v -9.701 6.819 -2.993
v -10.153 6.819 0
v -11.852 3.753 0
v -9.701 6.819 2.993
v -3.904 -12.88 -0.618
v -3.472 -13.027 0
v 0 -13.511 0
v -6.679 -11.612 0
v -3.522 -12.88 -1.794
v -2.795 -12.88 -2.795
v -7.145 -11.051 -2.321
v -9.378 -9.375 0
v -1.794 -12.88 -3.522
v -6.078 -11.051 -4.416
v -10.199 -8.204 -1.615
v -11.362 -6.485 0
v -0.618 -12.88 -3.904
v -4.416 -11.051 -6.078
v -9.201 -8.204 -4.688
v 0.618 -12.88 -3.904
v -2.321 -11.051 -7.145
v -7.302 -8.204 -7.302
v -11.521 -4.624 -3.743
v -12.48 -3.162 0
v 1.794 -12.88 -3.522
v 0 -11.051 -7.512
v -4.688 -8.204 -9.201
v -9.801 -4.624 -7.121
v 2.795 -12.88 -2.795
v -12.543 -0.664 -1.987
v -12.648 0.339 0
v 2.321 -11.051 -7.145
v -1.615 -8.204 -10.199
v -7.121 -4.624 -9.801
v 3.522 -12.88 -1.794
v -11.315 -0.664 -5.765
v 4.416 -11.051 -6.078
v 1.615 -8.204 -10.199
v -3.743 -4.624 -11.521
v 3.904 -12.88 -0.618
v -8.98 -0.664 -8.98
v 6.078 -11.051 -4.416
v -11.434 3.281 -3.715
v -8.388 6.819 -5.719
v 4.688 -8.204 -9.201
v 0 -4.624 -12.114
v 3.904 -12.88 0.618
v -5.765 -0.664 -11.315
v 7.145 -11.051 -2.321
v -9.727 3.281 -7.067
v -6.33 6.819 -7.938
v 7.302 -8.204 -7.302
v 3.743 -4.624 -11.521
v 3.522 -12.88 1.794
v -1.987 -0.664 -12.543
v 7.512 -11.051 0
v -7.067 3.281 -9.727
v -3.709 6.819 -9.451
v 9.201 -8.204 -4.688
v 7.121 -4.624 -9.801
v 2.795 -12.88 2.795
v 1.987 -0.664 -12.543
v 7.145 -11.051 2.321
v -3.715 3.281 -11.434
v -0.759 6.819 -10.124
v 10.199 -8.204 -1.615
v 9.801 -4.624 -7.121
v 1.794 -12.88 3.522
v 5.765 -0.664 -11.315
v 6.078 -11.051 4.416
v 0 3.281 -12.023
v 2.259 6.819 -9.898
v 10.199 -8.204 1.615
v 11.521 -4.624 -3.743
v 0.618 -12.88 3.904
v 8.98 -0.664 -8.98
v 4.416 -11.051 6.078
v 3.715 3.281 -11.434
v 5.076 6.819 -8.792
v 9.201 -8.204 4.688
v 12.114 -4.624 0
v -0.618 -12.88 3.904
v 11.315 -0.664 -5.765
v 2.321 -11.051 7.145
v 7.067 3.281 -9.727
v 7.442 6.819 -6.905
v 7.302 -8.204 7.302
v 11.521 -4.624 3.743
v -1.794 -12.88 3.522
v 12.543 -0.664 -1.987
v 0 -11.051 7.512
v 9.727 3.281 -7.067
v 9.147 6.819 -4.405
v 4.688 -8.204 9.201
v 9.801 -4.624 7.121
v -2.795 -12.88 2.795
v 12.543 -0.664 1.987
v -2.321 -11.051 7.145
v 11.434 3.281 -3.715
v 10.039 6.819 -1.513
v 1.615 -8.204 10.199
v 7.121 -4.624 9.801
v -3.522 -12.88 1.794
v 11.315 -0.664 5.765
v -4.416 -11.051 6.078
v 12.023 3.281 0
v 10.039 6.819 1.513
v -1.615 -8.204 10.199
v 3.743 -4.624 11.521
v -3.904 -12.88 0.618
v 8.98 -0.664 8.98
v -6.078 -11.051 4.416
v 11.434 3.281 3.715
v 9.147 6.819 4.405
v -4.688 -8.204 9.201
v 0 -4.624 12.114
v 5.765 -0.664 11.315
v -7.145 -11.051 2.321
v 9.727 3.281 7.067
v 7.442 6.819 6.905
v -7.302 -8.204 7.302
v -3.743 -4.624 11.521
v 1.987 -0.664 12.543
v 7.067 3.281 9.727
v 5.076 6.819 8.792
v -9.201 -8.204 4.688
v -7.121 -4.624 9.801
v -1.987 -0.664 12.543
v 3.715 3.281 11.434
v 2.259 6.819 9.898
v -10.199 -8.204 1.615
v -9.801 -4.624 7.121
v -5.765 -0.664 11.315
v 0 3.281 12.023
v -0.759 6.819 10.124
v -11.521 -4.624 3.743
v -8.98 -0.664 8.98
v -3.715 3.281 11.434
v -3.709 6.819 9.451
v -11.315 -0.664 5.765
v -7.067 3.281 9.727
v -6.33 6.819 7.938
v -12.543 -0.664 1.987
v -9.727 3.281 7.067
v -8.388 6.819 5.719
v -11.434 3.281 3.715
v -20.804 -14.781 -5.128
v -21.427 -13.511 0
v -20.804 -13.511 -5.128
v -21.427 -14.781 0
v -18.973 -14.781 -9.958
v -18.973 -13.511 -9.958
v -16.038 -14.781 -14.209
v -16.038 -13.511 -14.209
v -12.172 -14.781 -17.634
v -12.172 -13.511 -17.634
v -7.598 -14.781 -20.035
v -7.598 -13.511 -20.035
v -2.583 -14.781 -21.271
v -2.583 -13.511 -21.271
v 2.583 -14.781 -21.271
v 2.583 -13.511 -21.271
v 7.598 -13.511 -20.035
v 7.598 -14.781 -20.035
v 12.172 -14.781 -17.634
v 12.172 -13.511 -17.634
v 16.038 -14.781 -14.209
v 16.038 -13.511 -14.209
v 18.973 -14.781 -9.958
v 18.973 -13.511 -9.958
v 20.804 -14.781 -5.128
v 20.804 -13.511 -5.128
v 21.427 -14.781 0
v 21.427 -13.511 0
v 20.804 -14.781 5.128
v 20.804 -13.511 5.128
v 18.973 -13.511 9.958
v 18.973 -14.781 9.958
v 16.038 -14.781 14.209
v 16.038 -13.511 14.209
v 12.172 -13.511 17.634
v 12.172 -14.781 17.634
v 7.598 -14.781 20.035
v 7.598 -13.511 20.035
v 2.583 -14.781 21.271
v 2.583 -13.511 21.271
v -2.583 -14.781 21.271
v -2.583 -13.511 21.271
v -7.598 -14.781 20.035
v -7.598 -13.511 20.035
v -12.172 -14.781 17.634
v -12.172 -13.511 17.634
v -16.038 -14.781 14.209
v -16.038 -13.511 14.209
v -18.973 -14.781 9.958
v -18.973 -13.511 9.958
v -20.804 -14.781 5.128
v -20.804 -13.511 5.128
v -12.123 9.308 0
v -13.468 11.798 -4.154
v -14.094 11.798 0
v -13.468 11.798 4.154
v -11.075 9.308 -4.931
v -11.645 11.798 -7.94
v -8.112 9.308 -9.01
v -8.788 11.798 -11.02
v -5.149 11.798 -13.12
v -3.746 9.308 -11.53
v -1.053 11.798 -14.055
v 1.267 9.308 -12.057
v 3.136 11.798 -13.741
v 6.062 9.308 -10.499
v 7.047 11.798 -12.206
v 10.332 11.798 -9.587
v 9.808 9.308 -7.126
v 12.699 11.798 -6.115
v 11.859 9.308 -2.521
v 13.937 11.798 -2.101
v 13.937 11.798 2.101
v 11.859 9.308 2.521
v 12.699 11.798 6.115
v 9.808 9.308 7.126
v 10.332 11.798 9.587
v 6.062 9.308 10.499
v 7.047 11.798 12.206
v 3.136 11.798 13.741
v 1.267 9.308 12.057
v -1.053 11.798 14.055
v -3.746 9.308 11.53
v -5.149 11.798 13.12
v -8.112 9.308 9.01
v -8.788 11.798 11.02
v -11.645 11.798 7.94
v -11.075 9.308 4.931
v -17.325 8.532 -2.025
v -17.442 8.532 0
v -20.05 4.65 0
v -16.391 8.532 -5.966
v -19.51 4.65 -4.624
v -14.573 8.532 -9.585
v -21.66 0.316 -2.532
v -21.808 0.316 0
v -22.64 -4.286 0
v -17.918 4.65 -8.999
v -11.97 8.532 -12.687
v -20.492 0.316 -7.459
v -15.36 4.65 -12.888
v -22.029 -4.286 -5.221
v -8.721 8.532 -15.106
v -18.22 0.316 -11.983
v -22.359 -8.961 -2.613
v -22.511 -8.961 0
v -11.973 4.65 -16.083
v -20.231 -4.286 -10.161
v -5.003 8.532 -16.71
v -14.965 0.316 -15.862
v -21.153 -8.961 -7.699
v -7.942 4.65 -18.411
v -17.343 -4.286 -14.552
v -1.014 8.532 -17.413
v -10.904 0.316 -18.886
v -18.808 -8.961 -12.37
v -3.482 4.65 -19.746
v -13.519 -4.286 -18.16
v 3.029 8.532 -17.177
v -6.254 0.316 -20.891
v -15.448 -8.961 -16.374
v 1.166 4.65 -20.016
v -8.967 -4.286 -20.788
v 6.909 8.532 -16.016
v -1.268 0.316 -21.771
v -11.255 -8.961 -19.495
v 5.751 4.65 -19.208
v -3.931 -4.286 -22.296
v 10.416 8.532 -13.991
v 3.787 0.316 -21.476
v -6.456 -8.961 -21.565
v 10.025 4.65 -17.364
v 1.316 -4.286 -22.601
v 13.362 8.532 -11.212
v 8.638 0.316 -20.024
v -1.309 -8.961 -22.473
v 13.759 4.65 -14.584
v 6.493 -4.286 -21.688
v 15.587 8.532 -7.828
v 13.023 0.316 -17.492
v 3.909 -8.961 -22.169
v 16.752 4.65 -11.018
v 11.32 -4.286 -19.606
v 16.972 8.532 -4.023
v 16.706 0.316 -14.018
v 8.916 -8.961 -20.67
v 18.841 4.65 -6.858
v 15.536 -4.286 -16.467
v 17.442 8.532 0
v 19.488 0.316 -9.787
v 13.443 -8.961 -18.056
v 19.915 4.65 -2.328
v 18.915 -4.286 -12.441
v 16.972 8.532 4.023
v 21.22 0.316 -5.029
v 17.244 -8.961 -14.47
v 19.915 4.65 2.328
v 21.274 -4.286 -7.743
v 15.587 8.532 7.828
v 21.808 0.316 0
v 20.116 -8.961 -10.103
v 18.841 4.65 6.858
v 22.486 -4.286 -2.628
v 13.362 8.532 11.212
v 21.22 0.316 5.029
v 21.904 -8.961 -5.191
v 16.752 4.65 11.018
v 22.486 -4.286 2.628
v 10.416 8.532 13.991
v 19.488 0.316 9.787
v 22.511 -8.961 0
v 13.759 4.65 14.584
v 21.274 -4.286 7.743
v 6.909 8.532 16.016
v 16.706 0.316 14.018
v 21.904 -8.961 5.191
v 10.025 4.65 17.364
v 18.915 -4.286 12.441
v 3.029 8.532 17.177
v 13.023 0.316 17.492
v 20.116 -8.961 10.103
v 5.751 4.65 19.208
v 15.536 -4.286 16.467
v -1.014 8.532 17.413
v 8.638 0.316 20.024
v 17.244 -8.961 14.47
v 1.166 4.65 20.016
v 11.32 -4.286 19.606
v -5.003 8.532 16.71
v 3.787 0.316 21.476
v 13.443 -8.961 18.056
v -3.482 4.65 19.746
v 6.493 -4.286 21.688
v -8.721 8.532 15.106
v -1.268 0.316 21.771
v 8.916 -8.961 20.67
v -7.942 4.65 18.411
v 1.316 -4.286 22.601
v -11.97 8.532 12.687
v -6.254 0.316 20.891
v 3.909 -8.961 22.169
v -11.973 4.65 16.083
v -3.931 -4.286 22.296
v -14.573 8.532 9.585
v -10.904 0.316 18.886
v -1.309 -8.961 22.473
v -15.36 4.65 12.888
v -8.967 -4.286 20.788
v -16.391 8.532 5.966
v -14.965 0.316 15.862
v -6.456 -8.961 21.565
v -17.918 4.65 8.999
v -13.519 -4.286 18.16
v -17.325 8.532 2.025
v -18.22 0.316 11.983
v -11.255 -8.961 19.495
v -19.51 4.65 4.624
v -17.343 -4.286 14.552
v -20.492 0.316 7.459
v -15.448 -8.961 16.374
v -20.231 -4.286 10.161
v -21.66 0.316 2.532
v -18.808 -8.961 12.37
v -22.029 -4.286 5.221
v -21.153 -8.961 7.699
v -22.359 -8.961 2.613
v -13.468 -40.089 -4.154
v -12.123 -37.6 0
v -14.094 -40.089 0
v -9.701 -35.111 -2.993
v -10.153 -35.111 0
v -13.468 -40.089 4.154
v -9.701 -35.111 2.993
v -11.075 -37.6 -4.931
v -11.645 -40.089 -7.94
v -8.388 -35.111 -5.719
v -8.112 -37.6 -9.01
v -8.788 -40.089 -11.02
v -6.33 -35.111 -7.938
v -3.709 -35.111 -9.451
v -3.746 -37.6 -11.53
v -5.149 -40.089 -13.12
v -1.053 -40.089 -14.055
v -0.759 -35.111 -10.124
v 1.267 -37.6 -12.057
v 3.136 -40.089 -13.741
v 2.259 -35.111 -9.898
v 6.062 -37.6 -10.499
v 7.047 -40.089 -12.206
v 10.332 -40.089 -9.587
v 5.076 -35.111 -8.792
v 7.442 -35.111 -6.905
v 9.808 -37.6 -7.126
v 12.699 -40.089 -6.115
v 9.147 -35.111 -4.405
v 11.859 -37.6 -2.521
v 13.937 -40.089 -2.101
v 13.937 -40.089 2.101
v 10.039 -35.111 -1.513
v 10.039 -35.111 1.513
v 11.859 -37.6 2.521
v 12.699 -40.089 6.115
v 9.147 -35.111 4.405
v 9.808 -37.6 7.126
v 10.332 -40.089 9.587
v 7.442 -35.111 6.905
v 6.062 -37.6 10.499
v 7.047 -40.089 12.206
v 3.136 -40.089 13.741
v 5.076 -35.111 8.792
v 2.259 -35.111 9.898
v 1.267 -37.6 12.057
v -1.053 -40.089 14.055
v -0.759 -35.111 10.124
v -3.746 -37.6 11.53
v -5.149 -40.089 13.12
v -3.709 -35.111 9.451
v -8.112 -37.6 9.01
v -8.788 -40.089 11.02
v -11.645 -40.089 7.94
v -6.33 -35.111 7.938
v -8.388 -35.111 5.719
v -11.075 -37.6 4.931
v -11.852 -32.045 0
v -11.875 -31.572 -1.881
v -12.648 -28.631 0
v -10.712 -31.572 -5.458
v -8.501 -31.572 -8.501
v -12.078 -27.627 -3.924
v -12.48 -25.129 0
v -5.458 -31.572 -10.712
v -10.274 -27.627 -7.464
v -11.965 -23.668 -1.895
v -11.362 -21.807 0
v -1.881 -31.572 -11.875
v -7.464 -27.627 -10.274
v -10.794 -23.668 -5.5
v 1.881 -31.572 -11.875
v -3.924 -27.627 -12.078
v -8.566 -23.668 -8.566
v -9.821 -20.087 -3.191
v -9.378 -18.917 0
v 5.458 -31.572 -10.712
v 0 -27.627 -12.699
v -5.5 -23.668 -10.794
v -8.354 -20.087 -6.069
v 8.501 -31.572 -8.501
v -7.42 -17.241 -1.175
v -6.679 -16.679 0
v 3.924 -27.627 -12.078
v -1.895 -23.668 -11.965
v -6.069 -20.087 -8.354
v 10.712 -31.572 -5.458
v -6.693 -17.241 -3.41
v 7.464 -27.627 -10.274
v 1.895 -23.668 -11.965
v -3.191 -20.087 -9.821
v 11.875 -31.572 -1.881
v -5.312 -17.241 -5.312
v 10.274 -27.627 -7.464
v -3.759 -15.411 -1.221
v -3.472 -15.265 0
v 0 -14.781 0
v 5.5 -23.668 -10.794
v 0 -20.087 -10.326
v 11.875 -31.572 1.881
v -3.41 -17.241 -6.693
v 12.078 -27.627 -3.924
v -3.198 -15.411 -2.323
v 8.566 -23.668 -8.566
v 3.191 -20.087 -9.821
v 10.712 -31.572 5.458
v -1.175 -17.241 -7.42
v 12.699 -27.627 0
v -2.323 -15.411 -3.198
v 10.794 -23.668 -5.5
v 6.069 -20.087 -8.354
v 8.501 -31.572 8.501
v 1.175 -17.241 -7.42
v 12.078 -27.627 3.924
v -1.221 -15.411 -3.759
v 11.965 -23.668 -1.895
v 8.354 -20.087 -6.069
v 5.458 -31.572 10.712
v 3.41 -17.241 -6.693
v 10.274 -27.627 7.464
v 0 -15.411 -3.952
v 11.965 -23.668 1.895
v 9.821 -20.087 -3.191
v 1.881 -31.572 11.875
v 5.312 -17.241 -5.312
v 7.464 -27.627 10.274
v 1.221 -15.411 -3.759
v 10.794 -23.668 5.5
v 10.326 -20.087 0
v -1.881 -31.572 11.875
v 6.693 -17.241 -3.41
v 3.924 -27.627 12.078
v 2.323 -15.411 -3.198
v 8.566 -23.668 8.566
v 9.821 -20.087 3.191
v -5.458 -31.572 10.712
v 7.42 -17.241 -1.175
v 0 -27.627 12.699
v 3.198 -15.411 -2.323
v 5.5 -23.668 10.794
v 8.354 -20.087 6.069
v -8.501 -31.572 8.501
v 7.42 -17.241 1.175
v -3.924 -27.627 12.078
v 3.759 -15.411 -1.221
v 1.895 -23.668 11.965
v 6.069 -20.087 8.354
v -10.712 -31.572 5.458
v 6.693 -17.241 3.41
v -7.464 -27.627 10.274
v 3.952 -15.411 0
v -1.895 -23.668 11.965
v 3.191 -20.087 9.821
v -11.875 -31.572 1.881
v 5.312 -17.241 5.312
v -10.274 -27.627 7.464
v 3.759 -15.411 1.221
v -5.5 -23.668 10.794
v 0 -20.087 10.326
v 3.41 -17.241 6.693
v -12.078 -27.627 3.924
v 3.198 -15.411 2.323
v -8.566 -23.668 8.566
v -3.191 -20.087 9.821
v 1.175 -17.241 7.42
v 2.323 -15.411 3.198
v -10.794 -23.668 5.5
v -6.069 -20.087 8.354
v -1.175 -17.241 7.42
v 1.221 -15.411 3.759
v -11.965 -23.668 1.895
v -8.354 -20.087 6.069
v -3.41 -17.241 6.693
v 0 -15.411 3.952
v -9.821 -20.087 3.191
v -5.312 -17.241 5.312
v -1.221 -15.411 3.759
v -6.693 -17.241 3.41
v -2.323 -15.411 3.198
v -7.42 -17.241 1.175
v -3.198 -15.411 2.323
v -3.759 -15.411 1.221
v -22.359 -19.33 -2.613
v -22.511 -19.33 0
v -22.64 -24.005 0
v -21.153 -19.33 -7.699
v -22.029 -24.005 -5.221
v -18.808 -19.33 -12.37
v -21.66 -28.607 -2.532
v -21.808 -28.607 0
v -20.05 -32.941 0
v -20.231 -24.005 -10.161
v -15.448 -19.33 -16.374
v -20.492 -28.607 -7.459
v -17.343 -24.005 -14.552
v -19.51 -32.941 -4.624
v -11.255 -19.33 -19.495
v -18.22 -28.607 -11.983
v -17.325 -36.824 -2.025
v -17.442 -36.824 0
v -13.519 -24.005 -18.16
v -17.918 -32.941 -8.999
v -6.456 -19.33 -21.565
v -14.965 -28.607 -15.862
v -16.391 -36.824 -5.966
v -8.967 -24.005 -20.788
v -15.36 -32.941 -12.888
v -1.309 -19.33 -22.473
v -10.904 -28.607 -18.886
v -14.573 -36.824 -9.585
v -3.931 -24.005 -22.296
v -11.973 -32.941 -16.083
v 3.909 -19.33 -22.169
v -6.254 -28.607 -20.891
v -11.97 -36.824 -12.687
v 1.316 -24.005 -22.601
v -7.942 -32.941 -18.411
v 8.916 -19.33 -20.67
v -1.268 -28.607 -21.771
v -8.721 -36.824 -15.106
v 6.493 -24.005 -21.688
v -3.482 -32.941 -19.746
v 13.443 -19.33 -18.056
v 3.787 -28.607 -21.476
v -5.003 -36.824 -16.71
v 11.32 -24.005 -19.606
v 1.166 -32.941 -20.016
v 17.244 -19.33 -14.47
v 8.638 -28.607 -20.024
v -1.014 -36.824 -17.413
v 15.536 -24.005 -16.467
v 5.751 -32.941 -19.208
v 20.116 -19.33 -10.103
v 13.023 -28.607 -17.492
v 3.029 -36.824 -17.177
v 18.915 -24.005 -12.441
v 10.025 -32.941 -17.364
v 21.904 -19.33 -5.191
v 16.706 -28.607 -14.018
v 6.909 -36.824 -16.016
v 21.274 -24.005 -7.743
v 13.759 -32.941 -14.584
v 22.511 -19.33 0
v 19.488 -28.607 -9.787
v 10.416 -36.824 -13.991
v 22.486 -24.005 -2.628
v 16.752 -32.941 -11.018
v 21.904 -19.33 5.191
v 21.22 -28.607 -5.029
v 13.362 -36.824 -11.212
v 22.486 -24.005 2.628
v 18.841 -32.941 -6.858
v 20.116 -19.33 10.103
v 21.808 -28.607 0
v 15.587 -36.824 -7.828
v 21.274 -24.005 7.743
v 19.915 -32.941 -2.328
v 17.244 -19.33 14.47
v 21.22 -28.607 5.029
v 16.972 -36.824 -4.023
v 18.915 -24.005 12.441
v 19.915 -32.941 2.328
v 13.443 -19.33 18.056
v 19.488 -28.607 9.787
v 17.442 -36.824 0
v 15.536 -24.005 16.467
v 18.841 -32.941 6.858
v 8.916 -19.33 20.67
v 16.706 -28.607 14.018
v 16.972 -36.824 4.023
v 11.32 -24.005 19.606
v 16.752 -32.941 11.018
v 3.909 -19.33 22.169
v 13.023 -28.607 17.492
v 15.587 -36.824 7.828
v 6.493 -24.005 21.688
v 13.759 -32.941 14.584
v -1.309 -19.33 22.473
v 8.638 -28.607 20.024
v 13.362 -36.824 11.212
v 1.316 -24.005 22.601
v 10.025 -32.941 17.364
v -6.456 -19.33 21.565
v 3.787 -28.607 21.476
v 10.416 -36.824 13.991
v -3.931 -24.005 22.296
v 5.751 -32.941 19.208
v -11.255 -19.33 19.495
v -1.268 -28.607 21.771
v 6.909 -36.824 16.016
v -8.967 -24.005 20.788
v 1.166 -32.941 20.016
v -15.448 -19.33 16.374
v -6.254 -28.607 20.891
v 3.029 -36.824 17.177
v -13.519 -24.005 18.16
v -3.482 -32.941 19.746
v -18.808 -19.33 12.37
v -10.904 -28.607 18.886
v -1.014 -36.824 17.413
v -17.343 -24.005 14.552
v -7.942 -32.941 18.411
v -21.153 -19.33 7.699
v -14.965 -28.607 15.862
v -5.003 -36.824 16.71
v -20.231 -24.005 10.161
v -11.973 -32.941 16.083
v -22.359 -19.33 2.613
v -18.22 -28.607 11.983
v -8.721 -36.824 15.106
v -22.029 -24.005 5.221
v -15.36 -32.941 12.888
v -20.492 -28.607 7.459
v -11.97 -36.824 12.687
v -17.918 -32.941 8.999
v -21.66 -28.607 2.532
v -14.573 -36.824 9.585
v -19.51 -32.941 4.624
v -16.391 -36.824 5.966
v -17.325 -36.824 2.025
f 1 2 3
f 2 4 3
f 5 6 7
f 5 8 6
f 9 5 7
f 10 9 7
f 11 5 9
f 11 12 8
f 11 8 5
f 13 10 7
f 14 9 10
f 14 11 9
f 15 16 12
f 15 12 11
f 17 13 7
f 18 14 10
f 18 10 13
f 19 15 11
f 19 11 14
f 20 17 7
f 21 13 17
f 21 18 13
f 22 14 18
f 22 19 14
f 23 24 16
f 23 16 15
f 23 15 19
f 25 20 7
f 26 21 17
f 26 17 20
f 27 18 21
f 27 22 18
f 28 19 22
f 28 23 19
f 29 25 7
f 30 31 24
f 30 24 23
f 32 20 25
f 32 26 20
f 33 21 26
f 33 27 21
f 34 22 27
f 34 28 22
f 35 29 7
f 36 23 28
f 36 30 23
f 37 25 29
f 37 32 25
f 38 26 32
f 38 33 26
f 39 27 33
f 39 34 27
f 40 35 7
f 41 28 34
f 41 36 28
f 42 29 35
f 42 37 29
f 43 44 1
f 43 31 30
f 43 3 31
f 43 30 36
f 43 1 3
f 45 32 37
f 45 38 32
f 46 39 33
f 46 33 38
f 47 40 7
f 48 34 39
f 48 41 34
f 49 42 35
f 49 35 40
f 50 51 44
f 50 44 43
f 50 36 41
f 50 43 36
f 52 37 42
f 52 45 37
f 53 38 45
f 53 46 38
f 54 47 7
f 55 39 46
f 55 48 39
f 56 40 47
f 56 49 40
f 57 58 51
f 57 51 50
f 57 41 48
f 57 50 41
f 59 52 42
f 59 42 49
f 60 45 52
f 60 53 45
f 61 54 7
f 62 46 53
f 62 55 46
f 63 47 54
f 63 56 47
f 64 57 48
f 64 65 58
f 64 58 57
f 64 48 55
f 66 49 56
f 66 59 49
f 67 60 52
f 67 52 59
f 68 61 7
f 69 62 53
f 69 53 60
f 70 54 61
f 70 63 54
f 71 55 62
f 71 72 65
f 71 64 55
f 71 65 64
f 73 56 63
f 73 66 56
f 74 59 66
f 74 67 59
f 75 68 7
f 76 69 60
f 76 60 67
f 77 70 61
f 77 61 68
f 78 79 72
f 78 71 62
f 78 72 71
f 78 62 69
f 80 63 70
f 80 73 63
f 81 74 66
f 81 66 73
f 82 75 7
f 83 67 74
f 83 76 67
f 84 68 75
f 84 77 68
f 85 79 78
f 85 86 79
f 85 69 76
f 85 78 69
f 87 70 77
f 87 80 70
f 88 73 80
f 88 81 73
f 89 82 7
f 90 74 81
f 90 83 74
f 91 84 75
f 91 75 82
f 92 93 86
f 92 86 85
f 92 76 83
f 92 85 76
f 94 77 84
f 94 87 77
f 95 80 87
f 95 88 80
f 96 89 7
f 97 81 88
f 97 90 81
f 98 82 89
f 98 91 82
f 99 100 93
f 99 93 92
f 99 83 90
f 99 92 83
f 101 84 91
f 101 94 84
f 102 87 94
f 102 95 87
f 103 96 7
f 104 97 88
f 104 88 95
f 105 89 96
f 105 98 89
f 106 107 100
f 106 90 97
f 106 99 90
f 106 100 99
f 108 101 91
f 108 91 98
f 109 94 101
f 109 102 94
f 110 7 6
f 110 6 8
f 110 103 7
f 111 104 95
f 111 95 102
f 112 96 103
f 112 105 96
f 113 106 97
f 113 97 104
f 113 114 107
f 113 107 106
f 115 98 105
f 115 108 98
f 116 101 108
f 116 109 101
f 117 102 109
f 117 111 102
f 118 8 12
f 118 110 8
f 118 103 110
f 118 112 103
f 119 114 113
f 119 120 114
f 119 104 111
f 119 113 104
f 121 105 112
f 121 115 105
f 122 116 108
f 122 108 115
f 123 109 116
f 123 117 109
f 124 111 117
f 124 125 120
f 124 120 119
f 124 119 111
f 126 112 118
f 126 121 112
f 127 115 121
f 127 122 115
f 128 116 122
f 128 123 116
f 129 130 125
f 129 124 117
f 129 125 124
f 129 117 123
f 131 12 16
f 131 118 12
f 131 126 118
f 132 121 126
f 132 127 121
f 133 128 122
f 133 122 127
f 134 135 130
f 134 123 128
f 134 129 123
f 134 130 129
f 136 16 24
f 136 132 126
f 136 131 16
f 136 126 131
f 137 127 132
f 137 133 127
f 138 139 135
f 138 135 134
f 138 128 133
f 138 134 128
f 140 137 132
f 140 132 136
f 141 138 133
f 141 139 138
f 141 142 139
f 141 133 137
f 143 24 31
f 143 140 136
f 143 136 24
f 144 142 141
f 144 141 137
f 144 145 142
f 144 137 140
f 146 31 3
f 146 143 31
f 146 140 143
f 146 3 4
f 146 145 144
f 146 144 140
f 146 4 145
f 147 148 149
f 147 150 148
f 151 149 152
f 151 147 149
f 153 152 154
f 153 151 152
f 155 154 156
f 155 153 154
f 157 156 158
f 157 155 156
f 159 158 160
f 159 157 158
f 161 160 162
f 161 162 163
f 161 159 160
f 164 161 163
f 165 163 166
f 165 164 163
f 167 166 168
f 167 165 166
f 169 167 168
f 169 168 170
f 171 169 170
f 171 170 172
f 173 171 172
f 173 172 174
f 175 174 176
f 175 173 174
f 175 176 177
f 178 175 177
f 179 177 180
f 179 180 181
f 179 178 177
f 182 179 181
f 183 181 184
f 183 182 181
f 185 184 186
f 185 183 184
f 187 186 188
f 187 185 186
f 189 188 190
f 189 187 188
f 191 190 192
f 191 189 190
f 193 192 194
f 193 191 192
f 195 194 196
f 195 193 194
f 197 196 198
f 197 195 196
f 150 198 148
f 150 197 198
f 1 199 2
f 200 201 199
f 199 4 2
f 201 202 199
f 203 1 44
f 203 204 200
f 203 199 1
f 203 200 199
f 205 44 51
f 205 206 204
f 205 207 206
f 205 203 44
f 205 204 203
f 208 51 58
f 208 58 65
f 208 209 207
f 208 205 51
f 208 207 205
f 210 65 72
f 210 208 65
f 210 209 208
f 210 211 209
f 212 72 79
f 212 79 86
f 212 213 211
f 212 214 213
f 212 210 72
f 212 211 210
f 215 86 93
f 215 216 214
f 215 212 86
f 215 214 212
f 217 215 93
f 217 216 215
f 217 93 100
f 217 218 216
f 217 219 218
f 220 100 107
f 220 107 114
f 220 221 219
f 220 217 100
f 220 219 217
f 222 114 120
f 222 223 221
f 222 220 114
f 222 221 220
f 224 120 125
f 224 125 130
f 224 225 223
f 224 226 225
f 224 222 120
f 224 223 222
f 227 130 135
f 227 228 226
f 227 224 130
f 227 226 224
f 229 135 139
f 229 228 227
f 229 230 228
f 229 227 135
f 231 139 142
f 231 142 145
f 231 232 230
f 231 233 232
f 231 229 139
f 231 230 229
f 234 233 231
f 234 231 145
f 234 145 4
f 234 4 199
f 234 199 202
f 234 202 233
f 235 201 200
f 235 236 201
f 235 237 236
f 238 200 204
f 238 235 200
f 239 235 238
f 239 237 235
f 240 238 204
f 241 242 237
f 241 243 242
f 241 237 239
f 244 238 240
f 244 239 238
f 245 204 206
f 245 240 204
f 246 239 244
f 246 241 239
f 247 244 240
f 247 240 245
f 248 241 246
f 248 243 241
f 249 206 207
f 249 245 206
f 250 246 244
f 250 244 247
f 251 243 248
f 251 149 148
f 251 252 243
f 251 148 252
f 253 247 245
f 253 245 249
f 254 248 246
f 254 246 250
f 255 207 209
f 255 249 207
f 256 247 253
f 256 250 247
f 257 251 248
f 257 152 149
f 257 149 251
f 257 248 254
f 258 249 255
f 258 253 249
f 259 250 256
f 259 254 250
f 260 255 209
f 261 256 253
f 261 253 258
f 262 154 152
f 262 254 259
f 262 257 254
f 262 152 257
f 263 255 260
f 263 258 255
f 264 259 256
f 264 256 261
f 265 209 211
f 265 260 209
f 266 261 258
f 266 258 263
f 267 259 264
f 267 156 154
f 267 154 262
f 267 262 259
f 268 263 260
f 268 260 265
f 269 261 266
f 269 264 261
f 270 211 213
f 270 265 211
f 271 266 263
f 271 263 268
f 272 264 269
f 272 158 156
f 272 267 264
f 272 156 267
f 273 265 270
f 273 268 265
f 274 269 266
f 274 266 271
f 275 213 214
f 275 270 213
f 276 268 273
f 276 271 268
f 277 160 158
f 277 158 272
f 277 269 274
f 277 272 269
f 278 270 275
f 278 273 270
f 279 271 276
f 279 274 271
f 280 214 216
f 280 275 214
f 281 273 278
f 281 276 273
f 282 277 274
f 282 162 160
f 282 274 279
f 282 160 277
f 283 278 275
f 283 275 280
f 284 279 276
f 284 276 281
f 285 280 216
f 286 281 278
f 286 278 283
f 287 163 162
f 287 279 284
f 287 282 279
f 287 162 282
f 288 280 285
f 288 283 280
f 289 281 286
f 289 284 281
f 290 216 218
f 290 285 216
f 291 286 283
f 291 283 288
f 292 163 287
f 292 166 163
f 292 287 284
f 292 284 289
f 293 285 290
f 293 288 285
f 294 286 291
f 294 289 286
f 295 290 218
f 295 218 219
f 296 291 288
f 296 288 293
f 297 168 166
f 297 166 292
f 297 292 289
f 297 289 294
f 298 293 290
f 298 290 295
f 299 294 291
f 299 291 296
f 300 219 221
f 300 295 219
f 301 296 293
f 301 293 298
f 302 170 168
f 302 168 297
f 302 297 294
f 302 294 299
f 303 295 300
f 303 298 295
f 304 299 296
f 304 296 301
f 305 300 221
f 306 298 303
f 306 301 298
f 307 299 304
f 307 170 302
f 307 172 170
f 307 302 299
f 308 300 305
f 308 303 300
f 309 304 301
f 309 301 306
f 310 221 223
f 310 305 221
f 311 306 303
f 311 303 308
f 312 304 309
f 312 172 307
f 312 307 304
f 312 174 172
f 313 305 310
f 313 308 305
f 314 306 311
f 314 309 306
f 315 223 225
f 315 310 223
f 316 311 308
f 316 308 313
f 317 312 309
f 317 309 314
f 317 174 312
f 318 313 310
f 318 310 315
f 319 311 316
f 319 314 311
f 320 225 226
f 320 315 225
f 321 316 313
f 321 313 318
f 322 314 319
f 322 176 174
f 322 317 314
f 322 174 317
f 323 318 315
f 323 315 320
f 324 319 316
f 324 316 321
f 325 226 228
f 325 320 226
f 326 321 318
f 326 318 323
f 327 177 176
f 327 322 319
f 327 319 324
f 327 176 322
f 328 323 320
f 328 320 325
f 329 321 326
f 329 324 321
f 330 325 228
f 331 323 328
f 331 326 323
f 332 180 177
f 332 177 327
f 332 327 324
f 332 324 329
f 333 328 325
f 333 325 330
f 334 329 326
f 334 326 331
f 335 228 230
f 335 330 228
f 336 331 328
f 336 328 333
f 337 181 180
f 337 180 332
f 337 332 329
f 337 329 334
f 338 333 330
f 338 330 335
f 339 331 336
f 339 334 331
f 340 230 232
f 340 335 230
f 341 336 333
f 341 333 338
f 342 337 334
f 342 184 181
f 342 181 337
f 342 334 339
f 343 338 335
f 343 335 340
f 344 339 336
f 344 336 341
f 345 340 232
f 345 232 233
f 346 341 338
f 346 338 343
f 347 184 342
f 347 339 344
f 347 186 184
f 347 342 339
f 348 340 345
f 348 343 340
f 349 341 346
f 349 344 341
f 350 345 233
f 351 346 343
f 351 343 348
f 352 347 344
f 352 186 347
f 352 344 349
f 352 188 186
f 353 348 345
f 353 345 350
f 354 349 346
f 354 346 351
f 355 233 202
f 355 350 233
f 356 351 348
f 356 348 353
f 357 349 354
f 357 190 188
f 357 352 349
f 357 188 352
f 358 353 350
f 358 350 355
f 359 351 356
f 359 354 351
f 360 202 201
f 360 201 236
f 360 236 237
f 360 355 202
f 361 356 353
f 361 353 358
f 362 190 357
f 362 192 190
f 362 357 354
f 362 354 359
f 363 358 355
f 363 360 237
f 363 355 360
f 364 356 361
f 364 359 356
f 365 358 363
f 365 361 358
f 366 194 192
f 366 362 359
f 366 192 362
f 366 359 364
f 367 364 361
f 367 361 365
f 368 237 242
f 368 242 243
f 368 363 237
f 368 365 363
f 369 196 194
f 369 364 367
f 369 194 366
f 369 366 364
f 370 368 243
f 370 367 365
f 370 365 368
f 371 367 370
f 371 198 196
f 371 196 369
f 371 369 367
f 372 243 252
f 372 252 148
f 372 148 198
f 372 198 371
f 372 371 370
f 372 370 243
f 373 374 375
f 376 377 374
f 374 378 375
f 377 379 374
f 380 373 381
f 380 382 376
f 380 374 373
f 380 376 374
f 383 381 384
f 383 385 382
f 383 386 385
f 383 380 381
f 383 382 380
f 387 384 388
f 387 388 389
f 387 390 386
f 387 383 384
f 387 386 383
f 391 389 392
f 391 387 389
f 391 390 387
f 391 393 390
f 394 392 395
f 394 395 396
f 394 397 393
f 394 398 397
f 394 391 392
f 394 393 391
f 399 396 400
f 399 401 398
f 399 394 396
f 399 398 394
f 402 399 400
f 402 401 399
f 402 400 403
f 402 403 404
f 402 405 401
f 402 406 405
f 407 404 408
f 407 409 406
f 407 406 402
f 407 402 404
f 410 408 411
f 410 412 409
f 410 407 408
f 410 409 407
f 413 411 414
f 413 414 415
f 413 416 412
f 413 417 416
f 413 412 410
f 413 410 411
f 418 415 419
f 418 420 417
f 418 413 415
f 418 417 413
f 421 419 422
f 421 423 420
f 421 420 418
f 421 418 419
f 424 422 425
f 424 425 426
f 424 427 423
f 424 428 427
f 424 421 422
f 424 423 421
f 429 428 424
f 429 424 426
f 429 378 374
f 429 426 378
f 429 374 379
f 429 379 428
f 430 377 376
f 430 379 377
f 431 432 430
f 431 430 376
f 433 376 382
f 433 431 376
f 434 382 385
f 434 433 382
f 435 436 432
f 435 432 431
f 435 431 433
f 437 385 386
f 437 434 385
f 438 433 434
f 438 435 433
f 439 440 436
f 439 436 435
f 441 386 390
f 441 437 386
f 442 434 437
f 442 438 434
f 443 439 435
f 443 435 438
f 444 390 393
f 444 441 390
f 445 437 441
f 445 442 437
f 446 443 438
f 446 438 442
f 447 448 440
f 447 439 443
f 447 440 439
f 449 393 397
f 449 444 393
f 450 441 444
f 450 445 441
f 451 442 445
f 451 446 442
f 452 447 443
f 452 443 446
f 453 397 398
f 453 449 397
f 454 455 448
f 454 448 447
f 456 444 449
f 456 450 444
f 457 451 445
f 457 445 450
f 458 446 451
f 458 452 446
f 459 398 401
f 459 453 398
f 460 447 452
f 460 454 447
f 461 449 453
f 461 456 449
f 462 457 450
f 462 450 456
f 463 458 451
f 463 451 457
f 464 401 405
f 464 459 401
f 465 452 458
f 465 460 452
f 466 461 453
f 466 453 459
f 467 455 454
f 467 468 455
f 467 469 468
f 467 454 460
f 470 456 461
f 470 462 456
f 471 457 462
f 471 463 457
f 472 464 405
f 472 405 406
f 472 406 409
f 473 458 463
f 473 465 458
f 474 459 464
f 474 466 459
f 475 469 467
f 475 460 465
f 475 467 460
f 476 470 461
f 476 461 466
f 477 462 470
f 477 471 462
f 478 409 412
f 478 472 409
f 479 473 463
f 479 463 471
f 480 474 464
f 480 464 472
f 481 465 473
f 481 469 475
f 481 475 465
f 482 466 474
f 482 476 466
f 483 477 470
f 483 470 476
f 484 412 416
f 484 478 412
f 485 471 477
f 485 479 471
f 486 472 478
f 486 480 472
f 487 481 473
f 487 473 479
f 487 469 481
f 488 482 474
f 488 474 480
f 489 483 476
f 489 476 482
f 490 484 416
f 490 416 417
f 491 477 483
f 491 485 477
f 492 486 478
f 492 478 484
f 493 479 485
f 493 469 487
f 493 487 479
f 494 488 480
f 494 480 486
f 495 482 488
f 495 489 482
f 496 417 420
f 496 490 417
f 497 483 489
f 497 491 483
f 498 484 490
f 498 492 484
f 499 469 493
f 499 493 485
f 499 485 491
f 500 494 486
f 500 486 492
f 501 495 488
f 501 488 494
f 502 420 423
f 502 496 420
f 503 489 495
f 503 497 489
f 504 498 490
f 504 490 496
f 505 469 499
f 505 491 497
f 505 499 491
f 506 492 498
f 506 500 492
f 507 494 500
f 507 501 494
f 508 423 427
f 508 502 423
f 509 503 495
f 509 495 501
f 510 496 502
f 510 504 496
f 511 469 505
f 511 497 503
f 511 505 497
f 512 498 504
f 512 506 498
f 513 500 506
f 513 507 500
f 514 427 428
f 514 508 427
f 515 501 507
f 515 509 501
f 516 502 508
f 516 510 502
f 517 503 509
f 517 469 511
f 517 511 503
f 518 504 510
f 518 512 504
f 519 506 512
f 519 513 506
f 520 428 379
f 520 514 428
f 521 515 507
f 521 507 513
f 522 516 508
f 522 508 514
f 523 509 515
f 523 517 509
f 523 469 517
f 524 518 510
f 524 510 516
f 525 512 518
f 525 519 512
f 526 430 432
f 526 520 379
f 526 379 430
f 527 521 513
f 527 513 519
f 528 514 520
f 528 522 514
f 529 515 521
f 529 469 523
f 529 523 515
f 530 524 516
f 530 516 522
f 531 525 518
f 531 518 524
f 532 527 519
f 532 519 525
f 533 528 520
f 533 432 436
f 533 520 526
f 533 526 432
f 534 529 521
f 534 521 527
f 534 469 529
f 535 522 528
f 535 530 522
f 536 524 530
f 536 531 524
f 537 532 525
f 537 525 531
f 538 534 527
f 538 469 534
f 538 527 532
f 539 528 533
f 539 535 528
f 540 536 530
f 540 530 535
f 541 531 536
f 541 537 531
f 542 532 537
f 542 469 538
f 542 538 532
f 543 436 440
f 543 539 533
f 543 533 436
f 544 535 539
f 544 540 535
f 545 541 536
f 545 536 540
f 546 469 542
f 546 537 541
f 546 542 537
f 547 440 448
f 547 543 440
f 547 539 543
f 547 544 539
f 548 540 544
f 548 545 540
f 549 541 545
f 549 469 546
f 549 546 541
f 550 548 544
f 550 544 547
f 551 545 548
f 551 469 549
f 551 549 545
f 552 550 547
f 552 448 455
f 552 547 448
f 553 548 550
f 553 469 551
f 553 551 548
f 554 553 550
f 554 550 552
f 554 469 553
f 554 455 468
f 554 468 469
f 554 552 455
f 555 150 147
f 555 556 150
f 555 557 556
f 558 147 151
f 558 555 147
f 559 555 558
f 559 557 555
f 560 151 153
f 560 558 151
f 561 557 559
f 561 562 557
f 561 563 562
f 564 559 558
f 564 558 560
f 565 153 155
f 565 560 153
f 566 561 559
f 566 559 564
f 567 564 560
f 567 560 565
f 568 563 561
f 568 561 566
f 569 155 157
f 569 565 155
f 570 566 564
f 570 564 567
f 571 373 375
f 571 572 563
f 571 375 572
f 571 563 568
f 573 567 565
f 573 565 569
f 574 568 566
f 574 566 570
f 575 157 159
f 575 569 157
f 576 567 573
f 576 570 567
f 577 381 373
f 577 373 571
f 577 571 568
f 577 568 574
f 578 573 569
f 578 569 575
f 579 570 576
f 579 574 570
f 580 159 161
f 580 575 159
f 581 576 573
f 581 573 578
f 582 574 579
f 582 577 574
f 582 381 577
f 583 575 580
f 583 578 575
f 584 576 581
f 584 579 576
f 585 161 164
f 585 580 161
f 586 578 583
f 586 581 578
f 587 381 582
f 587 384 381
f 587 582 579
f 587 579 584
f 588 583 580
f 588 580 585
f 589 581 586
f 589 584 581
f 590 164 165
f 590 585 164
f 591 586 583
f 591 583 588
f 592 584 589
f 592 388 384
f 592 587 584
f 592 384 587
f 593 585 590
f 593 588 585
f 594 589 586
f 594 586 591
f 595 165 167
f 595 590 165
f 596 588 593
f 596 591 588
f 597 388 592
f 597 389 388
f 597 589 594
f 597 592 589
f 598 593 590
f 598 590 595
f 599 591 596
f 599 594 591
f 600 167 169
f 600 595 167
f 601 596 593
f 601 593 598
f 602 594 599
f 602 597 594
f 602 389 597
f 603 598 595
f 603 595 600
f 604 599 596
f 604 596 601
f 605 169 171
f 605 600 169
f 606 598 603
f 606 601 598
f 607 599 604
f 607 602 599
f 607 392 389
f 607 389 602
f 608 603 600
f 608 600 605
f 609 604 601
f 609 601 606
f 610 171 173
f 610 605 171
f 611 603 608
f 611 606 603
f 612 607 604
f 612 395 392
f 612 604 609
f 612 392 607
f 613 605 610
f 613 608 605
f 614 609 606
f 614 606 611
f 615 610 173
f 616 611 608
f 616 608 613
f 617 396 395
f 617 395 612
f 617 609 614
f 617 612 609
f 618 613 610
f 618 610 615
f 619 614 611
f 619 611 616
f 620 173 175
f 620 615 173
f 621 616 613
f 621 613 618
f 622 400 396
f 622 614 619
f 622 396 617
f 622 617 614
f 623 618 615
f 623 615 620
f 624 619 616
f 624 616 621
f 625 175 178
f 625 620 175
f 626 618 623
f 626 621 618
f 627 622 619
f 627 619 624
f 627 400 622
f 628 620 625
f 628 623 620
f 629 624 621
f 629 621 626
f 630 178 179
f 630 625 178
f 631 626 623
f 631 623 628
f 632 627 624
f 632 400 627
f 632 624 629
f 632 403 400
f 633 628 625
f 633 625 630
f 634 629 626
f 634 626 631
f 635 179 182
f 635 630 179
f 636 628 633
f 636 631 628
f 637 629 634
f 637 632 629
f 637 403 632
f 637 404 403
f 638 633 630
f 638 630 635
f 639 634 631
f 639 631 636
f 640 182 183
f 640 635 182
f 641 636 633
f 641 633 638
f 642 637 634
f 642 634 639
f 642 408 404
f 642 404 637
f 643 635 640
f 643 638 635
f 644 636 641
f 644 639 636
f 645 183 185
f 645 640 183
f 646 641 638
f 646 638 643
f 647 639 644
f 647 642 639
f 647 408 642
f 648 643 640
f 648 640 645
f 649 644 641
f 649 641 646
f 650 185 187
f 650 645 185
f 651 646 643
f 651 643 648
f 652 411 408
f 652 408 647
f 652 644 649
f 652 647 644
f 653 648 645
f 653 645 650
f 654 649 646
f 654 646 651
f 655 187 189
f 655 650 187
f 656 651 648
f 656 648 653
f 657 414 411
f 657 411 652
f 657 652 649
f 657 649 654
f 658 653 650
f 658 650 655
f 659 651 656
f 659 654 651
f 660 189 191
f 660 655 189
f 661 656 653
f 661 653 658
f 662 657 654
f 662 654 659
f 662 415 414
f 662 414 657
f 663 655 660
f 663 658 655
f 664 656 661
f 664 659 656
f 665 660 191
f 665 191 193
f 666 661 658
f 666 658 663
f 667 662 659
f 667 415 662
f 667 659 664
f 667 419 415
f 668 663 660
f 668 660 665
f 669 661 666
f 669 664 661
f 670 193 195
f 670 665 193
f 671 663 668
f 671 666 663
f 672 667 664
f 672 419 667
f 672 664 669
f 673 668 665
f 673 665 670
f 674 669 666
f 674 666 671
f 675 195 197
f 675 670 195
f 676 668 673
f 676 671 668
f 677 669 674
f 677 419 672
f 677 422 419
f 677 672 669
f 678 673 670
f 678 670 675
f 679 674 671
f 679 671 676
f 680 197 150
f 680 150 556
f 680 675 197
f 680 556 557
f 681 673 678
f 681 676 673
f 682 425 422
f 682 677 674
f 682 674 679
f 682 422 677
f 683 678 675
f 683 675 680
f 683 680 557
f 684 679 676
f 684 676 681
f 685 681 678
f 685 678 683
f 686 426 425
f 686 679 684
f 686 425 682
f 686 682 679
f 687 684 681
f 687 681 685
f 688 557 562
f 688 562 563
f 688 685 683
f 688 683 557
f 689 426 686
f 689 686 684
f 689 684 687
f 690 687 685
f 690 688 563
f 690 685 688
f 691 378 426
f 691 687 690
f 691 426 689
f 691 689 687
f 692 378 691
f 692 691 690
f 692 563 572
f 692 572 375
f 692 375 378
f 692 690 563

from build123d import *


with BuildPart() as f1:
    # F0 (on Top) → F1 (revolve)
    with BuildSketch(Plane.XY):
        with BuildLine():
            ThreePointArc((0, -13.5107505449), (-11.3620086767, -6.4847930924), (-10.1525229381, 6.8192086943))
            ThreePointArc((-10.1525229381, 6.8192086943), (-15.9881985309, -2.5605712732), (-14.5291043663, -13.5107505449))
            Line((-14.5291043663, -13.5107505449), (0, -13.5107505449))
        make_face()
        with BuildLine():
            ThreePointArc((-14.5291043663, -13.5107505449), (-15.9881985309, -2.5605712732), (-10.1525229381, 6.8192086943))
            Line((-10.1525229381, 6.8192086943), (-14.0944705725, 11.7975165241))
            ThreePointArc((-14.0944705725, 11.7975165241), (-21.8076146048, 0.3158808225), (-21.4270698922, -13.5107505449))
            Line((-21.4270698922, -13.5107505449), (-14.5291043663, -13.5107505449))
        make_face()
        Polygon((0, -14.7807505449), (0, -13.5107505449), (-14.5291043663, -13.5107505449), (-21.4270698922, -13.5107505449), (-21.4270698922, -14.7807505449), (-14.5291043663, -14.7807505449), align=None)
        with BuildLine():
            ThreePointArc((-10.1525229381, -35.110709784), (-11.3620086767, -21.8067079973), (0, -14.7807505449))
            Line((0, -14.7807505449), (-14.5291043663, -14.7807505449))
            ThreePointArc((-14.5291043663, -14.7807505449), (-15.9881985309, -25.7309298165), (-10.1525229381, -35.110709784))
        make_face()
        with BuildLine():
            ThreePointArc((-10.1525229381, -35.110709784), (-15.9881985309, -25.7309298165), (-14.5291043663, -14.7807505449))
            Line((-14.5291043663, -14.7807505449), (-21.4270698922, -14.7807505449))
            ThreePointArc((-21.4270698922, -14.7807505449), (-21.8076146048, -28.6073819122), (-14.0944705725, -40.0890176138))
            Line((-14.0944705725, -40.0890176138), (-10.1525229381, -35.110709784))
        make_face()
    revolve(axis=Axis((0, -14.1457505449, 0), (0, -1, 0)))


solid = f1.part
